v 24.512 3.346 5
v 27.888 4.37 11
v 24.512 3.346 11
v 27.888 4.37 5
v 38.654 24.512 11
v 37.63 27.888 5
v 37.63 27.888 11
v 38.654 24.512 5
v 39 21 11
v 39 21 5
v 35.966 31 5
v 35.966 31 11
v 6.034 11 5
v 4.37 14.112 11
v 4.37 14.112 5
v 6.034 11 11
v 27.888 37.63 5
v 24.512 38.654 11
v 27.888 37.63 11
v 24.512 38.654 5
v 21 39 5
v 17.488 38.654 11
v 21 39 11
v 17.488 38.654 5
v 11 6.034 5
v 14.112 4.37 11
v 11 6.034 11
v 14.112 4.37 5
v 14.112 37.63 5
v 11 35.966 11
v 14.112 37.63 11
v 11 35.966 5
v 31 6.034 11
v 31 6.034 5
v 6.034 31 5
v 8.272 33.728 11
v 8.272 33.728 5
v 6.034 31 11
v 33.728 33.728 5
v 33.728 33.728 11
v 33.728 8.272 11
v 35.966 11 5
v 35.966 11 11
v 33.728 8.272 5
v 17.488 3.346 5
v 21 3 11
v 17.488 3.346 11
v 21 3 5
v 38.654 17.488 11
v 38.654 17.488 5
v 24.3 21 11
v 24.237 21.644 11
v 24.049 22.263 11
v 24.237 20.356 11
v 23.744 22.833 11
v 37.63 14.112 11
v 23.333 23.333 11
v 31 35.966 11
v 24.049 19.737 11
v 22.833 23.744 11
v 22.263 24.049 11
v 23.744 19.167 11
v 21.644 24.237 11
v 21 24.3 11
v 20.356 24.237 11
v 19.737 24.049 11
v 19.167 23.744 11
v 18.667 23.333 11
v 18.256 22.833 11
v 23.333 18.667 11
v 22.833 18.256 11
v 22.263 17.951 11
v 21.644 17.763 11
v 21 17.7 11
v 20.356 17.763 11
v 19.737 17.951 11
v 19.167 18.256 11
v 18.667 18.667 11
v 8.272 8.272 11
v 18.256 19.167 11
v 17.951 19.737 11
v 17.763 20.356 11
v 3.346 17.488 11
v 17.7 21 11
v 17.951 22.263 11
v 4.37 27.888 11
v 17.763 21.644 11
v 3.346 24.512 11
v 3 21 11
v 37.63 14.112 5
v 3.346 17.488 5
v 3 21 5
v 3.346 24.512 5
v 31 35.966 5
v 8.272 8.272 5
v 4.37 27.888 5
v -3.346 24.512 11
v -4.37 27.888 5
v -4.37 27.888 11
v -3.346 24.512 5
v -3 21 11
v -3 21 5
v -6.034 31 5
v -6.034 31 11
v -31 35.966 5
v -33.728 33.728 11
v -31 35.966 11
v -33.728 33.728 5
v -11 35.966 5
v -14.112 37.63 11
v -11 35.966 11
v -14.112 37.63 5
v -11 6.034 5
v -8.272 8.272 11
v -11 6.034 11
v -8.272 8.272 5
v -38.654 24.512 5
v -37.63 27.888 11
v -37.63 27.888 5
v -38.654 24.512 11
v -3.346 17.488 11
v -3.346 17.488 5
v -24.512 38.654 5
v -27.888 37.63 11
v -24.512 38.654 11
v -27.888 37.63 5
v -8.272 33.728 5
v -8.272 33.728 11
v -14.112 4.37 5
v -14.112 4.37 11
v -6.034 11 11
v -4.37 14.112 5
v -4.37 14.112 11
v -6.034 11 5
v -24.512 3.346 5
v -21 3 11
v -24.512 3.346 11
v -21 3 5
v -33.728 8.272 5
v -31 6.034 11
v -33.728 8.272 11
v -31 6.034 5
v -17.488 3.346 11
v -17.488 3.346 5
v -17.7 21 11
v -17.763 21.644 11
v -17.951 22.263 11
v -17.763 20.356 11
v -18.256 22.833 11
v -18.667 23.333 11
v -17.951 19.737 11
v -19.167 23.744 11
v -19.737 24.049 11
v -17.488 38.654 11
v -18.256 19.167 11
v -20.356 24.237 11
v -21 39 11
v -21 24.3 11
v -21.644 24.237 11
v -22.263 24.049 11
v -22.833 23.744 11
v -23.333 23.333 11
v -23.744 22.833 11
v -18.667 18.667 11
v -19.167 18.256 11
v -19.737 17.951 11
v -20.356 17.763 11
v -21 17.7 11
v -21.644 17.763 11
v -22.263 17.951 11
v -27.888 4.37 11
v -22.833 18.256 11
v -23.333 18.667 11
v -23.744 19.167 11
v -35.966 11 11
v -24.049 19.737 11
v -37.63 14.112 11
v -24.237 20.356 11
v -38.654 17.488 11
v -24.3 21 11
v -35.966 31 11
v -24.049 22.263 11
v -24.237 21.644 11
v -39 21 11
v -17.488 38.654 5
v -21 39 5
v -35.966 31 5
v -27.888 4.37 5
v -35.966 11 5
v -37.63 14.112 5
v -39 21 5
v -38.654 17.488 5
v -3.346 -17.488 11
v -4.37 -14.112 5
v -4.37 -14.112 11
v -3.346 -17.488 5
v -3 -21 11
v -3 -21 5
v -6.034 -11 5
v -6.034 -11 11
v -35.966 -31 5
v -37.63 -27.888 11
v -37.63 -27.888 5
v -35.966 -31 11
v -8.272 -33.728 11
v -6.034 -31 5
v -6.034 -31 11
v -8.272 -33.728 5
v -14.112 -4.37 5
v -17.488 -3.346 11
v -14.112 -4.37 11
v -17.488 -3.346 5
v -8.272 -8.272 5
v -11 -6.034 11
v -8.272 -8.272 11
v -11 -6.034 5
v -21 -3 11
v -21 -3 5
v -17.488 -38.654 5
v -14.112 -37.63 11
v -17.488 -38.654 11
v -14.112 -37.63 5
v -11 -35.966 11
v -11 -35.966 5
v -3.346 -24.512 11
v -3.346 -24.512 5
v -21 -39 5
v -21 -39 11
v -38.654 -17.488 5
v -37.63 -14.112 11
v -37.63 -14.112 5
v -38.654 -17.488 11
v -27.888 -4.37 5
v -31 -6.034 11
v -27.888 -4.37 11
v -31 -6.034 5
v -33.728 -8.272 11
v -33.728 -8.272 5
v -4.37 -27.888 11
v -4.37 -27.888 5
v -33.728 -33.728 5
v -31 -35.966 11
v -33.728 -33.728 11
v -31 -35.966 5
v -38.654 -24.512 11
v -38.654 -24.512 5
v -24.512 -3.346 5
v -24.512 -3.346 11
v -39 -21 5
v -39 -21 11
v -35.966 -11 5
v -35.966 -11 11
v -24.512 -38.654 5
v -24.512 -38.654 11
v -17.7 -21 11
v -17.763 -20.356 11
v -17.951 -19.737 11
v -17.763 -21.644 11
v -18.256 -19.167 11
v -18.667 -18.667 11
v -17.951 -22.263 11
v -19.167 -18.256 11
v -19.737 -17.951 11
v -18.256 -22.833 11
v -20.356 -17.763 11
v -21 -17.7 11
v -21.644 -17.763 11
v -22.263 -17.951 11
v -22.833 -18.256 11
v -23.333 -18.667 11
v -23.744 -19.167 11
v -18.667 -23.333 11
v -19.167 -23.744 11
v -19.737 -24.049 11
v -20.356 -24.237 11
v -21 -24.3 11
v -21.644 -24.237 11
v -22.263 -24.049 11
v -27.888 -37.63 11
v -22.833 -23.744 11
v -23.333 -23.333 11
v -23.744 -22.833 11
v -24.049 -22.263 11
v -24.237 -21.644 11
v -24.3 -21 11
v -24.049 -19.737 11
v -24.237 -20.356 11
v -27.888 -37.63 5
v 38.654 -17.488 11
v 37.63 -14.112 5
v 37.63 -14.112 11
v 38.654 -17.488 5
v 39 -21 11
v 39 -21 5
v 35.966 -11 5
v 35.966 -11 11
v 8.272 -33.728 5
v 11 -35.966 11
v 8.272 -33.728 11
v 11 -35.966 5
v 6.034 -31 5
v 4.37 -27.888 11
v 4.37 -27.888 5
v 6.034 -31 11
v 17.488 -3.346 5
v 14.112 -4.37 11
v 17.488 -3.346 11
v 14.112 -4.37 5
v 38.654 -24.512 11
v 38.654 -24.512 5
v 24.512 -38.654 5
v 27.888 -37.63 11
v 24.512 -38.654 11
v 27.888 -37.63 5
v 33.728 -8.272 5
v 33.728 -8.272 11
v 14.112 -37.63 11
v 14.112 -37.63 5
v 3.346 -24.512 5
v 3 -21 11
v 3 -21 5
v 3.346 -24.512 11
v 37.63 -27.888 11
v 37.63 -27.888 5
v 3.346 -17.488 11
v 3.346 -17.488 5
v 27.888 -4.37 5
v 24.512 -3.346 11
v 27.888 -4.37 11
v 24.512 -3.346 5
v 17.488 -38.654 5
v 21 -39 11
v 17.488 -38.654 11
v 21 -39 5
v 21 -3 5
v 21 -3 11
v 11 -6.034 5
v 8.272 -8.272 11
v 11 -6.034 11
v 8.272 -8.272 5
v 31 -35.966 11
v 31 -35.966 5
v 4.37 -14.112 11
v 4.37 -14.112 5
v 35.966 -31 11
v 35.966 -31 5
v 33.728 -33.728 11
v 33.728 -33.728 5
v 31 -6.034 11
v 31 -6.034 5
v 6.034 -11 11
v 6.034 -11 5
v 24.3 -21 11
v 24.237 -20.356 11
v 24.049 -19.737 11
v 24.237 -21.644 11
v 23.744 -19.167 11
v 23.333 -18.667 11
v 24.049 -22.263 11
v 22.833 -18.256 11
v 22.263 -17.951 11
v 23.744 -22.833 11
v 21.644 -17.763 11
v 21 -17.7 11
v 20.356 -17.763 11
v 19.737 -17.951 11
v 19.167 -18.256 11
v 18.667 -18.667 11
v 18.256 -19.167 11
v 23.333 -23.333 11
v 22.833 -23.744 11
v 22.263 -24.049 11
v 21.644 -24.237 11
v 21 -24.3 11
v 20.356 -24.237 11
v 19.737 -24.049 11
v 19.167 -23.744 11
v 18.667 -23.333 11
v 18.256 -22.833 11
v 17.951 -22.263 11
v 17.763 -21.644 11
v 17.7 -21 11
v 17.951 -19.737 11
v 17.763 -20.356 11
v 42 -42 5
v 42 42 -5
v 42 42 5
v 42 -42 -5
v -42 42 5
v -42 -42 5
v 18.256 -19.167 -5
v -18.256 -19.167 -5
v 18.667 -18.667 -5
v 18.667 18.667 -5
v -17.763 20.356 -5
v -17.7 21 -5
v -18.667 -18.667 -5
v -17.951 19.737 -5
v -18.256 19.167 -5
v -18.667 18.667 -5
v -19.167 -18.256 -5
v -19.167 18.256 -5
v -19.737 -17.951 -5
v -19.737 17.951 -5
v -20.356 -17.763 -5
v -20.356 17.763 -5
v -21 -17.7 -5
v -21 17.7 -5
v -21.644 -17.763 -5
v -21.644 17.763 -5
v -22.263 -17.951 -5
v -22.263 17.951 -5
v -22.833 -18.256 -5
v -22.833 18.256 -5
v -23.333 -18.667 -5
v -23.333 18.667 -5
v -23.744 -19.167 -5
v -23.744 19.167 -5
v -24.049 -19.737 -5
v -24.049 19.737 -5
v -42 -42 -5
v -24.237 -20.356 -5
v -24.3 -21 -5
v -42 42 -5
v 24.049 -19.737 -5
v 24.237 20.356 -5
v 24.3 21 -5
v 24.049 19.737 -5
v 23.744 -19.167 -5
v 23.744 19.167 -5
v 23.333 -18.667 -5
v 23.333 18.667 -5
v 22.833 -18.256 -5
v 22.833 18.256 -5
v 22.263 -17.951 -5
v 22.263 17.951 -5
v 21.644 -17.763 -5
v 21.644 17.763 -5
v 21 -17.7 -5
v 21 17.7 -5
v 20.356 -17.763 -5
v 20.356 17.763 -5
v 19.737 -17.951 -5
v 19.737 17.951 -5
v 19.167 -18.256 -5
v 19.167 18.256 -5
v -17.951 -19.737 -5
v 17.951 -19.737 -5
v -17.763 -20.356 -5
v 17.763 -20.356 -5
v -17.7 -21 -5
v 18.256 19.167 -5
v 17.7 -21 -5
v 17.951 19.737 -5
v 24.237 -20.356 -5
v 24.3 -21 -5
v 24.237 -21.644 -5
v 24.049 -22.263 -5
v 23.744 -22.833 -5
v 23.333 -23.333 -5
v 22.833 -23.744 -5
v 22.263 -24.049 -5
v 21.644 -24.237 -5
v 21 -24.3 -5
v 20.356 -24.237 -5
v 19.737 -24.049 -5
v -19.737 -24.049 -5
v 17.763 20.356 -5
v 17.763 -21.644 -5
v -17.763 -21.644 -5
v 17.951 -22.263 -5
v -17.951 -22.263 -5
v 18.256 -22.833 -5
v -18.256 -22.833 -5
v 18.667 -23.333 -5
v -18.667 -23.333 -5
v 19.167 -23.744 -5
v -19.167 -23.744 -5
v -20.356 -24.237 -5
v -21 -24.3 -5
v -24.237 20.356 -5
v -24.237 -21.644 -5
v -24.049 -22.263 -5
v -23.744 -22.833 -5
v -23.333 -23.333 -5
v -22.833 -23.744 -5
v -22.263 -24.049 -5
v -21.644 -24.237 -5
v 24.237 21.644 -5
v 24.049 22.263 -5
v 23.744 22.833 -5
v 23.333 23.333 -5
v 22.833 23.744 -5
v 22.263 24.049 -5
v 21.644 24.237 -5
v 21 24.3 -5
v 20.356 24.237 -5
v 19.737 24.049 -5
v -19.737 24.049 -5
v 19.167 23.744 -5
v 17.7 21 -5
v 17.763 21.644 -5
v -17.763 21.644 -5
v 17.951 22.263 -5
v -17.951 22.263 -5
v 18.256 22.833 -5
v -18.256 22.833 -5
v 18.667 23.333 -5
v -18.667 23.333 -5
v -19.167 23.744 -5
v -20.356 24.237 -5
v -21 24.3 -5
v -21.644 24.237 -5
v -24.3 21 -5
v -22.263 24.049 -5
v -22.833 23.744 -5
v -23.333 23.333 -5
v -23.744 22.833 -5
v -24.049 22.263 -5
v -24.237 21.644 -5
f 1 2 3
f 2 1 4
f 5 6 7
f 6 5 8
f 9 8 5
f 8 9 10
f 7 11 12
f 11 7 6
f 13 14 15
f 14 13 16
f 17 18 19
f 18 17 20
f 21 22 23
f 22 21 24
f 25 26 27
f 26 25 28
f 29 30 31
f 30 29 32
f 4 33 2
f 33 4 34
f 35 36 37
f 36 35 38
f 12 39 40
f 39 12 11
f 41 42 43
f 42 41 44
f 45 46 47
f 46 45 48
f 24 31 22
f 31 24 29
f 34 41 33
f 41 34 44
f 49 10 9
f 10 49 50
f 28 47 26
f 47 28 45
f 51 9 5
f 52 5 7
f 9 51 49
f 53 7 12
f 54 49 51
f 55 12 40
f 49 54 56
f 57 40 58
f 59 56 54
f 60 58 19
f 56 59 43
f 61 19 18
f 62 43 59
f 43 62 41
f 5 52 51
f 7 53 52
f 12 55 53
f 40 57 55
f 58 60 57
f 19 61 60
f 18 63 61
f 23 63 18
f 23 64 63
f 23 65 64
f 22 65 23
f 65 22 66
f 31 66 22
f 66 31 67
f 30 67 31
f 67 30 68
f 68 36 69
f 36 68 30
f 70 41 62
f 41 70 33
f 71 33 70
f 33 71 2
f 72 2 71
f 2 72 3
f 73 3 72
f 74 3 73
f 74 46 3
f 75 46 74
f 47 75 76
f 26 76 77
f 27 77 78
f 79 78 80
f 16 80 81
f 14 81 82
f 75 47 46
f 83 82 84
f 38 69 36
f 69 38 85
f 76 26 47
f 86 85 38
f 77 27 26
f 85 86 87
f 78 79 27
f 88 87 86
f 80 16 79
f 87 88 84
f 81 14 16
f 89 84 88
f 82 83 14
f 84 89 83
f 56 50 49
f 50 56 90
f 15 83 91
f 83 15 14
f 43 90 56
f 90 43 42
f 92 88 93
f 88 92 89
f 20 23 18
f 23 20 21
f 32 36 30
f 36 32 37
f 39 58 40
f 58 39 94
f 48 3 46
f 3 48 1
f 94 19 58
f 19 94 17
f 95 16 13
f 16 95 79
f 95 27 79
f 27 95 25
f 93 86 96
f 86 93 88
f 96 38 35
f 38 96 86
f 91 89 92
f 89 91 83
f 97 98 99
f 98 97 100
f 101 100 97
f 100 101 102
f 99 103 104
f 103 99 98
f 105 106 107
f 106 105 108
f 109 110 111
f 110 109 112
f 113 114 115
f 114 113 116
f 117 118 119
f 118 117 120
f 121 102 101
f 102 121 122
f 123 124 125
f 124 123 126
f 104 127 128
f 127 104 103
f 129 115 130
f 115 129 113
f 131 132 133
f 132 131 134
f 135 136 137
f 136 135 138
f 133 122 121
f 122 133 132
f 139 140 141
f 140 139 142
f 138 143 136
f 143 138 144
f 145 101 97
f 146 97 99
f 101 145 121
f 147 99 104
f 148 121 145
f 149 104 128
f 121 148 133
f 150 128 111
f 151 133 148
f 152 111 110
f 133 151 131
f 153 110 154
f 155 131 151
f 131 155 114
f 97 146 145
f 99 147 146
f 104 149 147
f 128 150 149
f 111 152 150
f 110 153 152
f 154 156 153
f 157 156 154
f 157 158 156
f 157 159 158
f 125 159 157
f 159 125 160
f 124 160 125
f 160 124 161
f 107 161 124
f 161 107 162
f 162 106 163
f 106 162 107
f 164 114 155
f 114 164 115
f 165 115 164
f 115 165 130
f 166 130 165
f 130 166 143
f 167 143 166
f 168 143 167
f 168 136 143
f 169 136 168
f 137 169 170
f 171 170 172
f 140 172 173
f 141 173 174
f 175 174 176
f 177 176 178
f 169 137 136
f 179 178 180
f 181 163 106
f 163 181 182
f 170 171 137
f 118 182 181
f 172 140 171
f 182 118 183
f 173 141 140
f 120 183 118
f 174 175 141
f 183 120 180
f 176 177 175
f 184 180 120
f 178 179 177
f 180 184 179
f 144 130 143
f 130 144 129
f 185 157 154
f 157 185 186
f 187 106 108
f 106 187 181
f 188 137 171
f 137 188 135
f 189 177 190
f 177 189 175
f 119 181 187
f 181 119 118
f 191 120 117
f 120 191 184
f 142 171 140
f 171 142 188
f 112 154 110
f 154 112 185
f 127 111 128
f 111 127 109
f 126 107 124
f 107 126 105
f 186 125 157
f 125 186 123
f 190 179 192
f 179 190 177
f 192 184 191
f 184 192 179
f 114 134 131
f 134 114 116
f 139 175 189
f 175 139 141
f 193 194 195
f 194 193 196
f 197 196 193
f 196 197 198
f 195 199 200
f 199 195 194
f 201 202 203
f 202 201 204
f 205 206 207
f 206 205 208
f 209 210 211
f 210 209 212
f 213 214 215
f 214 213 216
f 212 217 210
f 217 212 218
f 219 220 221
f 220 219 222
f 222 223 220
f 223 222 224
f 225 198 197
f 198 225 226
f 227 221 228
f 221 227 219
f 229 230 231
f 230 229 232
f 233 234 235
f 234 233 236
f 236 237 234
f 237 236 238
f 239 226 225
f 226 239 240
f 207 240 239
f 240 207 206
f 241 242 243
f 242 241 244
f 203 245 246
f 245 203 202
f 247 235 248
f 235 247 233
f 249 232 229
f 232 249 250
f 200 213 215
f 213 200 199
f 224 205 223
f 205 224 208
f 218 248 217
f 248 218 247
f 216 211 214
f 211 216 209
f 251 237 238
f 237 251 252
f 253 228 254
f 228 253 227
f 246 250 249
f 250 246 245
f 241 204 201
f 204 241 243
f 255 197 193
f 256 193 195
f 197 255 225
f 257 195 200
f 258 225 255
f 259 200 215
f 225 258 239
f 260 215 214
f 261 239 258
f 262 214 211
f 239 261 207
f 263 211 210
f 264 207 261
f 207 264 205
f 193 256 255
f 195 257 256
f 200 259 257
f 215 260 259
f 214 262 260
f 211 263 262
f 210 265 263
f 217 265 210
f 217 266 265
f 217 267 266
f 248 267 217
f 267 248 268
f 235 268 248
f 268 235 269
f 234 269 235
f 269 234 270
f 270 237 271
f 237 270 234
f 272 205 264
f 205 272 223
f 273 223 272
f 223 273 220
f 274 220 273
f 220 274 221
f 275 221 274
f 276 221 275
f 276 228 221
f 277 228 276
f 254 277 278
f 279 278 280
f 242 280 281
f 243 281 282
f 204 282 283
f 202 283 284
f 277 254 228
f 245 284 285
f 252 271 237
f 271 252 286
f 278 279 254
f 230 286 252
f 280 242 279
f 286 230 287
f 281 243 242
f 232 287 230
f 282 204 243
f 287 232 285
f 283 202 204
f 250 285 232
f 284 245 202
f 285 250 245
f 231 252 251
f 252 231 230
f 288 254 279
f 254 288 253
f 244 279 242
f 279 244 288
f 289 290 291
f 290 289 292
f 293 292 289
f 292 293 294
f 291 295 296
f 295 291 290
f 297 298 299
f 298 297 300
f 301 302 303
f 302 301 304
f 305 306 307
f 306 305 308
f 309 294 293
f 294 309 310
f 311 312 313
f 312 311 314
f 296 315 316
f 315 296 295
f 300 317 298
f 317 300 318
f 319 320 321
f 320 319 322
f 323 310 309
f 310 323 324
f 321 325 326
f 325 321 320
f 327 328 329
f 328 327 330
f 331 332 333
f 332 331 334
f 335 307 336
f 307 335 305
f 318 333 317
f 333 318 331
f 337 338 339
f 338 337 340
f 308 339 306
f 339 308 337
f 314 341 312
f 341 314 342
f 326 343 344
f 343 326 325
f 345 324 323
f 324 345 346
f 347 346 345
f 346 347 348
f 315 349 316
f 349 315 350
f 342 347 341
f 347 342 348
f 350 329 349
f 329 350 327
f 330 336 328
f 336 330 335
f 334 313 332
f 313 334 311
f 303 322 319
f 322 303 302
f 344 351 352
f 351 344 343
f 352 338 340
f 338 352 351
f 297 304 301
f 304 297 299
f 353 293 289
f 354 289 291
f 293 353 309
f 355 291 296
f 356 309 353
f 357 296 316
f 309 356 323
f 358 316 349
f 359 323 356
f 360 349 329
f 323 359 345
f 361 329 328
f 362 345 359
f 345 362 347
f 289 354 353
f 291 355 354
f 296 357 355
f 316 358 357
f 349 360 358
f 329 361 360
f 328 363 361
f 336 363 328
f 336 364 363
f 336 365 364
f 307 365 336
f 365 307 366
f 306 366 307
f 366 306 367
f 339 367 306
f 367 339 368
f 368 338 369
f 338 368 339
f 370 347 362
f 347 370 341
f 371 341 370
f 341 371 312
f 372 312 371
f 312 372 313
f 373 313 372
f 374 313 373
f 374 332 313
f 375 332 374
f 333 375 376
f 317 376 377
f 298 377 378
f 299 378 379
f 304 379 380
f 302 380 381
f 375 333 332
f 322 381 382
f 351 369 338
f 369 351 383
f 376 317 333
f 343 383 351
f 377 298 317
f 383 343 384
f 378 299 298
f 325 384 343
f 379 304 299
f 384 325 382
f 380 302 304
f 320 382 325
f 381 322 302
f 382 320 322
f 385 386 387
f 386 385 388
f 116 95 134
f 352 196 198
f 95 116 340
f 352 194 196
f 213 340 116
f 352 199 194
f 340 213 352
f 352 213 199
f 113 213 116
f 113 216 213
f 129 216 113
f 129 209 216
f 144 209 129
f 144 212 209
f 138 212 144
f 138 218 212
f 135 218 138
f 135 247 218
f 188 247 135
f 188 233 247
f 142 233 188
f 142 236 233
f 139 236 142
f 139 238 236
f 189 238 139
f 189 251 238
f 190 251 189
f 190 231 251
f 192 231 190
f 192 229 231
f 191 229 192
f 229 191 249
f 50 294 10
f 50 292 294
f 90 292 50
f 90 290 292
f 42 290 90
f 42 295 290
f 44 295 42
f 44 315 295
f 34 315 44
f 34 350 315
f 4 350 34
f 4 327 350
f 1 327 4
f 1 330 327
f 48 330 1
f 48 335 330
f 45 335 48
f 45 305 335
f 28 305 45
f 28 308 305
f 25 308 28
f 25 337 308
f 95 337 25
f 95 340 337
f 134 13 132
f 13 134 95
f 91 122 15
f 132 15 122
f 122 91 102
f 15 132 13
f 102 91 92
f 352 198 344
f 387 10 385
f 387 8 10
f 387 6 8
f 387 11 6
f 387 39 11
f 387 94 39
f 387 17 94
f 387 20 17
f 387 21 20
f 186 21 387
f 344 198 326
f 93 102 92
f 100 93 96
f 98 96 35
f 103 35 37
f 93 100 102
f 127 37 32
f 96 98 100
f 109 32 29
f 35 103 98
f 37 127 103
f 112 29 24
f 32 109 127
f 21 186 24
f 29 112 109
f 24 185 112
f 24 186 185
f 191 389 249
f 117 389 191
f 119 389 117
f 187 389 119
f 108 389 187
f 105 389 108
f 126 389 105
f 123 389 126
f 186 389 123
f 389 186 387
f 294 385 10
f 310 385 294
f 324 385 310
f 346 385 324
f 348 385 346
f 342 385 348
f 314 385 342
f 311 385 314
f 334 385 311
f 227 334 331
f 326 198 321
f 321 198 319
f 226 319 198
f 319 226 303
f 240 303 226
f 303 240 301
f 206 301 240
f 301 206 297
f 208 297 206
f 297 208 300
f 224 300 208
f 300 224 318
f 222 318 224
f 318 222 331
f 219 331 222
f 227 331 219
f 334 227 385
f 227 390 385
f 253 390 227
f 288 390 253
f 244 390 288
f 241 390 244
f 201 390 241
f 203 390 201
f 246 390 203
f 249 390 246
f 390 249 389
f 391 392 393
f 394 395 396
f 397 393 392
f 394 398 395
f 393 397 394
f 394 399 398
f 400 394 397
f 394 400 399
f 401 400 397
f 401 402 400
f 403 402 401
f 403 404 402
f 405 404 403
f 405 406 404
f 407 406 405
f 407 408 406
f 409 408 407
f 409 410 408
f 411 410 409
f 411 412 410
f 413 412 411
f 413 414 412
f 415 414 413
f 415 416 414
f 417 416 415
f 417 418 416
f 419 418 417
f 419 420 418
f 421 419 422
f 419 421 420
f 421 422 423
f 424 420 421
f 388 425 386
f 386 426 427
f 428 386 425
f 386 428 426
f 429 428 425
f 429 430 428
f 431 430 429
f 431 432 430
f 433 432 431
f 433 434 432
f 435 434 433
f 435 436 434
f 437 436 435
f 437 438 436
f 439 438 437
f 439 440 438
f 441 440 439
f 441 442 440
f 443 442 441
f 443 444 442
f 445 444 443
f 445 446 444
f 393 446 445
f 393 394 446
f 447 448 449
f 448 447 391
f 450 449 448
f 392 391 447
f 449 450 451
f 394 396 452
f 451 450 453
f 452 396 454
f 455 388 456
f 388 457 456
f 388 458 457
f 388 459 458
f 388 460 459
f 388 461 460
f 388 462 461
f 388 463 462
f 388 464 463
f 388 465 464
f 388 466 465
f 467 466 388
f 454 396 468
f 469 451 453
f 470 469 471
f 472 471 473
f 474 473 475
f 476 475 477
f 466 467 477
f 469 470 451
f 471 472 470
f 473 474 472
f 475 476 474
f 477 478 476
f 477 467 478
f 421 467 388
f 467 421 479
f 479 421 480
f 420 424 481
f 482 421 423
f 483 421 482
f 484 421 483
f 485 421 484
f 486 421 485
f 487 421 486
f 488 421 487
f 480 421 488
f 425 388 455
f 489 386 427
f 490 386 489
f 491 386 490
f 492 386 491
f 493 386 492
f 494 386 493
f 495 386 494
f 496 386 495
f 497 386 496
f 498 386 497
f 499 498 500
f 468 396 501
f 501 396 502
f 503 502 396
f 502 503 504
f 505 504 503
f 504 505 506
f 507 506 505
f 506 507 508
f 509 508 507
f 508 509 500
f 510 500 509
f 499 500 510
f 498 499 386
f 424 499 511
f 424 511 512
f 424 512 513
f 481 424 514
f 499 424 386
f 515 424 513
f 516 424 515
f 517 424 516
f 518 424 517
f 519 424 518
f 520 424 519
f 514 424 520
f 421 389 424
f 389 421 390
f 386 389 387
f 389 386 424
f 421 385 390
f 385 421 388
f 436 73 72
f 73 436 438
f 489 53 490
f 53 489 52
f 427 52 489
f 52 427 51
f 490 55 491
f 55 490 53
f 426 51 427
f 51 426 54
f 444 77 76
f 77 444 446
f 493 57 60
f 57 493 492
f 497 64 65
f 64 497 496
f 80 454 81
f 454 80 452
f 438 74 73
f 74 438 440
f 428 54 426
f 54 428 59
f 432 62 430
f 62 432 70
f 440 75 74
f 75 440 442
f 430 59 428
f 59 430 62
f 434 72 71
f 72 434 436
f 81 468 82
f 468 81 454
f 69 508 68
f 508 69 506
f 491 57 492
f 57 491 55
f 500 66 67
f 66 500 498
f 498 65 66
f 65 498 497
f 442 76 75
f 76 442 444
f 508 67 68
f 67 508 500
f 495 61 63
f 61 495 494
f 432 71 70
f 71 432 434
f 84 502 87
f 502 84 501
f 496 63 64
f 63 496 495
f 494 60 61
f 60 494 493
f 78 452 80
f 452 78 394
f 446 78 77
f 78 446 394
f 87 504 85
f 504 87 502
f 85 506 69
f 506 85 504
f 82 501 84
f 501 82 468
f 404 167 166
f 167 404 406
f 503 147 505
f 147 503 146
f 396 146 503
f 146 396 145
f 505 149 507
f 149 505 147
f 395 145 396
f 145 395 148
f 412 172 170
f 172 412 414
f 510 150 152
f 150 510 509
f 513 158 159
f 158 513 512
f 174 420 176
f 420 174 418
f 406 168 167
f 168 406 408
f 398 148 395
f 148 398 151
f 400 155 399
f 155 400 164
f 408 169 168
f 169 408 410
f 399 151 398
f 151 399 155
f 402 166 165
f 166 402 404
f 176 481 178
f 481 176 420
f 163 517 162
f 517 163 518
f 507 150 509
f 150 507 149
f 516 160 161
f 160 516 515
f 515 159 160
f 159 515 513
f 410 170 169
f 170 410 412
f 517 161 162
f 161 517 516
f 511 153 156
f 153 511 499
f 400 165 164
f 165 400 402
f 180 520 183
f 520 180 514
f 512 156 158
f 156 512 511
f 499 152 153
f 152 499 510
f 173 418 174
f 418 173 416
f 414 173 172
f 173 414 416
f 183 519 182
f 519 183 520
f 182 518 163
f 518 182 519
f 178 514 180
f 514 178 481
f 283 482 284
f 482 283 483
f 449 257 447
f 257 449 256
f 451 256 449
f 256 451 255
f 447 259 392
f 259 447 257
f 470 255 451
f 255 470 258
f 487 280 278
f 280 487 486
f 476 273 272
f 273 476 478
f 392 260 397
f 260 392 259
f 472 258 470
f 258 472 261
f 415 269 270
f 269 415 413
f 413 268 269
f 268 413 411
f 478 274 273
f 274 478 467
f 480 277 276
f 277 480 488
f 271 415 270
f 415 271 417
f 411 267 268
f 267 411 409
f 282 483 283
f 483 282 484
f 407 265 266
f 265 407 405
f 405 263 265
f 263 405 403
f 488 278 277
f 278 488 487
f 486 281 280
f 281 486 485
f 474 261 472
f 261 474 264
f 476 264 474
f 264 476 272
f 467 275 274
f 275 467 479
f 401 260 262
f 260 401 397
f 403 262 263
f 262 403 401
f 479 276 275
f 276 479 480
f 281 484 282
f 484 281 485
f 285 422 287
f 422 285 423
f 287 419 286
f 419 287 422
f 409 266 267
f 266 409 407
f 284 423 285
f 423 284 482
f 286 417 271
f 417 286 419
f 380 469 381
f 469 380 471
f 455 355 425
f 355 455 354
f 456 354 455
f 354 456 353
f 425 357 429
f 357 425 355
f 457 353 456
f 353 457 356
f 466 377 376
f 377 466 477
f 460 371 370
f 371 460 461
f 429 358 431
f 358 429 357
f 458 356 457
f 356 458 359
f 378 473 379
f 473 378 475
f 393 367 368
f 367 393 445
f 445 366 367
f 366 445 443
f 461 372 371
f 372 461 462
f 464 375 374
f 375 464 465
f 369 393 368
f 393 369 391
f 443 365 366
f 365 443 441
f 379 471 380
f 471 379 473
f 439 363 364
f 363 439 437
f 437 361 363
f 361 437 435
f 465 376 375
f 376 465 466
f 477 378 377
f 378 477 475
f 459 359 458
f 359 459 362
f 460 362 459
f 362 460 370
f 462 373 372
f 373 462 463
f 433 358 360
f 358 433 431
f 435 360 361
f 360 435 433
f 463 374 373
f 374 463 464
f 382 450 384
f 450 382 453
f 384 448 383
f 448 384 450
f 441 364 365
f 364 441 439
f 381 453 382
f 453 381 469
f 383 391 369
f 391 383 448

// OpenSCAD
$fn = 32;

// ----------------------------------------------------------------------
// Anchor pads 84 x 84 x 16
// four corner bosses with anchor holes
// ----------------------------------------------------------------------

// --- parameters (mm) ---
plate = [84, 84, 10];  // base plate size (x, y, z)
pads = 4;              // boss count, one per corner
edge = 21;             // boss centre offset from the plate edge
boss_d = 36;           // boss diameter
boss_h = 6;            // boss height above the base plate
hole_d = 6.6;          // hole diameter

// --- derived feature positions (mm) ---
height = plate[2] + boss_h;      // = 16   overall height of the part
corner_x = plate[0] / 2 - edge;  // = 21   boss centre X
corner_y = plate[1] / 2 - edge;  // = 21   boss centre Y
feature_centers = [
  [corner_x, corner_y],
  [-corner_x, corner_y],
  [-corner_x, -corner_y],
  [corner_x, -corner_y]
];   // boss centres, anchor holes are drilled there

// base plate, four bosses standing on it, anchor holes all the way through
difference() {
  union() {
    cube(plate, center = true);
    for (centre = feature_centers)
      translate([centre[0], centre[1], plate[2] / 2 - 1])
        cylinder(d = boss_d, h = boss_h + 1);
  }
  for (centre = feature_centers)
    translate([centre[0], centre[1], -height])
      cylinder(d = hole_d, h = 2 * height + 2);  // through boss and plate
}
